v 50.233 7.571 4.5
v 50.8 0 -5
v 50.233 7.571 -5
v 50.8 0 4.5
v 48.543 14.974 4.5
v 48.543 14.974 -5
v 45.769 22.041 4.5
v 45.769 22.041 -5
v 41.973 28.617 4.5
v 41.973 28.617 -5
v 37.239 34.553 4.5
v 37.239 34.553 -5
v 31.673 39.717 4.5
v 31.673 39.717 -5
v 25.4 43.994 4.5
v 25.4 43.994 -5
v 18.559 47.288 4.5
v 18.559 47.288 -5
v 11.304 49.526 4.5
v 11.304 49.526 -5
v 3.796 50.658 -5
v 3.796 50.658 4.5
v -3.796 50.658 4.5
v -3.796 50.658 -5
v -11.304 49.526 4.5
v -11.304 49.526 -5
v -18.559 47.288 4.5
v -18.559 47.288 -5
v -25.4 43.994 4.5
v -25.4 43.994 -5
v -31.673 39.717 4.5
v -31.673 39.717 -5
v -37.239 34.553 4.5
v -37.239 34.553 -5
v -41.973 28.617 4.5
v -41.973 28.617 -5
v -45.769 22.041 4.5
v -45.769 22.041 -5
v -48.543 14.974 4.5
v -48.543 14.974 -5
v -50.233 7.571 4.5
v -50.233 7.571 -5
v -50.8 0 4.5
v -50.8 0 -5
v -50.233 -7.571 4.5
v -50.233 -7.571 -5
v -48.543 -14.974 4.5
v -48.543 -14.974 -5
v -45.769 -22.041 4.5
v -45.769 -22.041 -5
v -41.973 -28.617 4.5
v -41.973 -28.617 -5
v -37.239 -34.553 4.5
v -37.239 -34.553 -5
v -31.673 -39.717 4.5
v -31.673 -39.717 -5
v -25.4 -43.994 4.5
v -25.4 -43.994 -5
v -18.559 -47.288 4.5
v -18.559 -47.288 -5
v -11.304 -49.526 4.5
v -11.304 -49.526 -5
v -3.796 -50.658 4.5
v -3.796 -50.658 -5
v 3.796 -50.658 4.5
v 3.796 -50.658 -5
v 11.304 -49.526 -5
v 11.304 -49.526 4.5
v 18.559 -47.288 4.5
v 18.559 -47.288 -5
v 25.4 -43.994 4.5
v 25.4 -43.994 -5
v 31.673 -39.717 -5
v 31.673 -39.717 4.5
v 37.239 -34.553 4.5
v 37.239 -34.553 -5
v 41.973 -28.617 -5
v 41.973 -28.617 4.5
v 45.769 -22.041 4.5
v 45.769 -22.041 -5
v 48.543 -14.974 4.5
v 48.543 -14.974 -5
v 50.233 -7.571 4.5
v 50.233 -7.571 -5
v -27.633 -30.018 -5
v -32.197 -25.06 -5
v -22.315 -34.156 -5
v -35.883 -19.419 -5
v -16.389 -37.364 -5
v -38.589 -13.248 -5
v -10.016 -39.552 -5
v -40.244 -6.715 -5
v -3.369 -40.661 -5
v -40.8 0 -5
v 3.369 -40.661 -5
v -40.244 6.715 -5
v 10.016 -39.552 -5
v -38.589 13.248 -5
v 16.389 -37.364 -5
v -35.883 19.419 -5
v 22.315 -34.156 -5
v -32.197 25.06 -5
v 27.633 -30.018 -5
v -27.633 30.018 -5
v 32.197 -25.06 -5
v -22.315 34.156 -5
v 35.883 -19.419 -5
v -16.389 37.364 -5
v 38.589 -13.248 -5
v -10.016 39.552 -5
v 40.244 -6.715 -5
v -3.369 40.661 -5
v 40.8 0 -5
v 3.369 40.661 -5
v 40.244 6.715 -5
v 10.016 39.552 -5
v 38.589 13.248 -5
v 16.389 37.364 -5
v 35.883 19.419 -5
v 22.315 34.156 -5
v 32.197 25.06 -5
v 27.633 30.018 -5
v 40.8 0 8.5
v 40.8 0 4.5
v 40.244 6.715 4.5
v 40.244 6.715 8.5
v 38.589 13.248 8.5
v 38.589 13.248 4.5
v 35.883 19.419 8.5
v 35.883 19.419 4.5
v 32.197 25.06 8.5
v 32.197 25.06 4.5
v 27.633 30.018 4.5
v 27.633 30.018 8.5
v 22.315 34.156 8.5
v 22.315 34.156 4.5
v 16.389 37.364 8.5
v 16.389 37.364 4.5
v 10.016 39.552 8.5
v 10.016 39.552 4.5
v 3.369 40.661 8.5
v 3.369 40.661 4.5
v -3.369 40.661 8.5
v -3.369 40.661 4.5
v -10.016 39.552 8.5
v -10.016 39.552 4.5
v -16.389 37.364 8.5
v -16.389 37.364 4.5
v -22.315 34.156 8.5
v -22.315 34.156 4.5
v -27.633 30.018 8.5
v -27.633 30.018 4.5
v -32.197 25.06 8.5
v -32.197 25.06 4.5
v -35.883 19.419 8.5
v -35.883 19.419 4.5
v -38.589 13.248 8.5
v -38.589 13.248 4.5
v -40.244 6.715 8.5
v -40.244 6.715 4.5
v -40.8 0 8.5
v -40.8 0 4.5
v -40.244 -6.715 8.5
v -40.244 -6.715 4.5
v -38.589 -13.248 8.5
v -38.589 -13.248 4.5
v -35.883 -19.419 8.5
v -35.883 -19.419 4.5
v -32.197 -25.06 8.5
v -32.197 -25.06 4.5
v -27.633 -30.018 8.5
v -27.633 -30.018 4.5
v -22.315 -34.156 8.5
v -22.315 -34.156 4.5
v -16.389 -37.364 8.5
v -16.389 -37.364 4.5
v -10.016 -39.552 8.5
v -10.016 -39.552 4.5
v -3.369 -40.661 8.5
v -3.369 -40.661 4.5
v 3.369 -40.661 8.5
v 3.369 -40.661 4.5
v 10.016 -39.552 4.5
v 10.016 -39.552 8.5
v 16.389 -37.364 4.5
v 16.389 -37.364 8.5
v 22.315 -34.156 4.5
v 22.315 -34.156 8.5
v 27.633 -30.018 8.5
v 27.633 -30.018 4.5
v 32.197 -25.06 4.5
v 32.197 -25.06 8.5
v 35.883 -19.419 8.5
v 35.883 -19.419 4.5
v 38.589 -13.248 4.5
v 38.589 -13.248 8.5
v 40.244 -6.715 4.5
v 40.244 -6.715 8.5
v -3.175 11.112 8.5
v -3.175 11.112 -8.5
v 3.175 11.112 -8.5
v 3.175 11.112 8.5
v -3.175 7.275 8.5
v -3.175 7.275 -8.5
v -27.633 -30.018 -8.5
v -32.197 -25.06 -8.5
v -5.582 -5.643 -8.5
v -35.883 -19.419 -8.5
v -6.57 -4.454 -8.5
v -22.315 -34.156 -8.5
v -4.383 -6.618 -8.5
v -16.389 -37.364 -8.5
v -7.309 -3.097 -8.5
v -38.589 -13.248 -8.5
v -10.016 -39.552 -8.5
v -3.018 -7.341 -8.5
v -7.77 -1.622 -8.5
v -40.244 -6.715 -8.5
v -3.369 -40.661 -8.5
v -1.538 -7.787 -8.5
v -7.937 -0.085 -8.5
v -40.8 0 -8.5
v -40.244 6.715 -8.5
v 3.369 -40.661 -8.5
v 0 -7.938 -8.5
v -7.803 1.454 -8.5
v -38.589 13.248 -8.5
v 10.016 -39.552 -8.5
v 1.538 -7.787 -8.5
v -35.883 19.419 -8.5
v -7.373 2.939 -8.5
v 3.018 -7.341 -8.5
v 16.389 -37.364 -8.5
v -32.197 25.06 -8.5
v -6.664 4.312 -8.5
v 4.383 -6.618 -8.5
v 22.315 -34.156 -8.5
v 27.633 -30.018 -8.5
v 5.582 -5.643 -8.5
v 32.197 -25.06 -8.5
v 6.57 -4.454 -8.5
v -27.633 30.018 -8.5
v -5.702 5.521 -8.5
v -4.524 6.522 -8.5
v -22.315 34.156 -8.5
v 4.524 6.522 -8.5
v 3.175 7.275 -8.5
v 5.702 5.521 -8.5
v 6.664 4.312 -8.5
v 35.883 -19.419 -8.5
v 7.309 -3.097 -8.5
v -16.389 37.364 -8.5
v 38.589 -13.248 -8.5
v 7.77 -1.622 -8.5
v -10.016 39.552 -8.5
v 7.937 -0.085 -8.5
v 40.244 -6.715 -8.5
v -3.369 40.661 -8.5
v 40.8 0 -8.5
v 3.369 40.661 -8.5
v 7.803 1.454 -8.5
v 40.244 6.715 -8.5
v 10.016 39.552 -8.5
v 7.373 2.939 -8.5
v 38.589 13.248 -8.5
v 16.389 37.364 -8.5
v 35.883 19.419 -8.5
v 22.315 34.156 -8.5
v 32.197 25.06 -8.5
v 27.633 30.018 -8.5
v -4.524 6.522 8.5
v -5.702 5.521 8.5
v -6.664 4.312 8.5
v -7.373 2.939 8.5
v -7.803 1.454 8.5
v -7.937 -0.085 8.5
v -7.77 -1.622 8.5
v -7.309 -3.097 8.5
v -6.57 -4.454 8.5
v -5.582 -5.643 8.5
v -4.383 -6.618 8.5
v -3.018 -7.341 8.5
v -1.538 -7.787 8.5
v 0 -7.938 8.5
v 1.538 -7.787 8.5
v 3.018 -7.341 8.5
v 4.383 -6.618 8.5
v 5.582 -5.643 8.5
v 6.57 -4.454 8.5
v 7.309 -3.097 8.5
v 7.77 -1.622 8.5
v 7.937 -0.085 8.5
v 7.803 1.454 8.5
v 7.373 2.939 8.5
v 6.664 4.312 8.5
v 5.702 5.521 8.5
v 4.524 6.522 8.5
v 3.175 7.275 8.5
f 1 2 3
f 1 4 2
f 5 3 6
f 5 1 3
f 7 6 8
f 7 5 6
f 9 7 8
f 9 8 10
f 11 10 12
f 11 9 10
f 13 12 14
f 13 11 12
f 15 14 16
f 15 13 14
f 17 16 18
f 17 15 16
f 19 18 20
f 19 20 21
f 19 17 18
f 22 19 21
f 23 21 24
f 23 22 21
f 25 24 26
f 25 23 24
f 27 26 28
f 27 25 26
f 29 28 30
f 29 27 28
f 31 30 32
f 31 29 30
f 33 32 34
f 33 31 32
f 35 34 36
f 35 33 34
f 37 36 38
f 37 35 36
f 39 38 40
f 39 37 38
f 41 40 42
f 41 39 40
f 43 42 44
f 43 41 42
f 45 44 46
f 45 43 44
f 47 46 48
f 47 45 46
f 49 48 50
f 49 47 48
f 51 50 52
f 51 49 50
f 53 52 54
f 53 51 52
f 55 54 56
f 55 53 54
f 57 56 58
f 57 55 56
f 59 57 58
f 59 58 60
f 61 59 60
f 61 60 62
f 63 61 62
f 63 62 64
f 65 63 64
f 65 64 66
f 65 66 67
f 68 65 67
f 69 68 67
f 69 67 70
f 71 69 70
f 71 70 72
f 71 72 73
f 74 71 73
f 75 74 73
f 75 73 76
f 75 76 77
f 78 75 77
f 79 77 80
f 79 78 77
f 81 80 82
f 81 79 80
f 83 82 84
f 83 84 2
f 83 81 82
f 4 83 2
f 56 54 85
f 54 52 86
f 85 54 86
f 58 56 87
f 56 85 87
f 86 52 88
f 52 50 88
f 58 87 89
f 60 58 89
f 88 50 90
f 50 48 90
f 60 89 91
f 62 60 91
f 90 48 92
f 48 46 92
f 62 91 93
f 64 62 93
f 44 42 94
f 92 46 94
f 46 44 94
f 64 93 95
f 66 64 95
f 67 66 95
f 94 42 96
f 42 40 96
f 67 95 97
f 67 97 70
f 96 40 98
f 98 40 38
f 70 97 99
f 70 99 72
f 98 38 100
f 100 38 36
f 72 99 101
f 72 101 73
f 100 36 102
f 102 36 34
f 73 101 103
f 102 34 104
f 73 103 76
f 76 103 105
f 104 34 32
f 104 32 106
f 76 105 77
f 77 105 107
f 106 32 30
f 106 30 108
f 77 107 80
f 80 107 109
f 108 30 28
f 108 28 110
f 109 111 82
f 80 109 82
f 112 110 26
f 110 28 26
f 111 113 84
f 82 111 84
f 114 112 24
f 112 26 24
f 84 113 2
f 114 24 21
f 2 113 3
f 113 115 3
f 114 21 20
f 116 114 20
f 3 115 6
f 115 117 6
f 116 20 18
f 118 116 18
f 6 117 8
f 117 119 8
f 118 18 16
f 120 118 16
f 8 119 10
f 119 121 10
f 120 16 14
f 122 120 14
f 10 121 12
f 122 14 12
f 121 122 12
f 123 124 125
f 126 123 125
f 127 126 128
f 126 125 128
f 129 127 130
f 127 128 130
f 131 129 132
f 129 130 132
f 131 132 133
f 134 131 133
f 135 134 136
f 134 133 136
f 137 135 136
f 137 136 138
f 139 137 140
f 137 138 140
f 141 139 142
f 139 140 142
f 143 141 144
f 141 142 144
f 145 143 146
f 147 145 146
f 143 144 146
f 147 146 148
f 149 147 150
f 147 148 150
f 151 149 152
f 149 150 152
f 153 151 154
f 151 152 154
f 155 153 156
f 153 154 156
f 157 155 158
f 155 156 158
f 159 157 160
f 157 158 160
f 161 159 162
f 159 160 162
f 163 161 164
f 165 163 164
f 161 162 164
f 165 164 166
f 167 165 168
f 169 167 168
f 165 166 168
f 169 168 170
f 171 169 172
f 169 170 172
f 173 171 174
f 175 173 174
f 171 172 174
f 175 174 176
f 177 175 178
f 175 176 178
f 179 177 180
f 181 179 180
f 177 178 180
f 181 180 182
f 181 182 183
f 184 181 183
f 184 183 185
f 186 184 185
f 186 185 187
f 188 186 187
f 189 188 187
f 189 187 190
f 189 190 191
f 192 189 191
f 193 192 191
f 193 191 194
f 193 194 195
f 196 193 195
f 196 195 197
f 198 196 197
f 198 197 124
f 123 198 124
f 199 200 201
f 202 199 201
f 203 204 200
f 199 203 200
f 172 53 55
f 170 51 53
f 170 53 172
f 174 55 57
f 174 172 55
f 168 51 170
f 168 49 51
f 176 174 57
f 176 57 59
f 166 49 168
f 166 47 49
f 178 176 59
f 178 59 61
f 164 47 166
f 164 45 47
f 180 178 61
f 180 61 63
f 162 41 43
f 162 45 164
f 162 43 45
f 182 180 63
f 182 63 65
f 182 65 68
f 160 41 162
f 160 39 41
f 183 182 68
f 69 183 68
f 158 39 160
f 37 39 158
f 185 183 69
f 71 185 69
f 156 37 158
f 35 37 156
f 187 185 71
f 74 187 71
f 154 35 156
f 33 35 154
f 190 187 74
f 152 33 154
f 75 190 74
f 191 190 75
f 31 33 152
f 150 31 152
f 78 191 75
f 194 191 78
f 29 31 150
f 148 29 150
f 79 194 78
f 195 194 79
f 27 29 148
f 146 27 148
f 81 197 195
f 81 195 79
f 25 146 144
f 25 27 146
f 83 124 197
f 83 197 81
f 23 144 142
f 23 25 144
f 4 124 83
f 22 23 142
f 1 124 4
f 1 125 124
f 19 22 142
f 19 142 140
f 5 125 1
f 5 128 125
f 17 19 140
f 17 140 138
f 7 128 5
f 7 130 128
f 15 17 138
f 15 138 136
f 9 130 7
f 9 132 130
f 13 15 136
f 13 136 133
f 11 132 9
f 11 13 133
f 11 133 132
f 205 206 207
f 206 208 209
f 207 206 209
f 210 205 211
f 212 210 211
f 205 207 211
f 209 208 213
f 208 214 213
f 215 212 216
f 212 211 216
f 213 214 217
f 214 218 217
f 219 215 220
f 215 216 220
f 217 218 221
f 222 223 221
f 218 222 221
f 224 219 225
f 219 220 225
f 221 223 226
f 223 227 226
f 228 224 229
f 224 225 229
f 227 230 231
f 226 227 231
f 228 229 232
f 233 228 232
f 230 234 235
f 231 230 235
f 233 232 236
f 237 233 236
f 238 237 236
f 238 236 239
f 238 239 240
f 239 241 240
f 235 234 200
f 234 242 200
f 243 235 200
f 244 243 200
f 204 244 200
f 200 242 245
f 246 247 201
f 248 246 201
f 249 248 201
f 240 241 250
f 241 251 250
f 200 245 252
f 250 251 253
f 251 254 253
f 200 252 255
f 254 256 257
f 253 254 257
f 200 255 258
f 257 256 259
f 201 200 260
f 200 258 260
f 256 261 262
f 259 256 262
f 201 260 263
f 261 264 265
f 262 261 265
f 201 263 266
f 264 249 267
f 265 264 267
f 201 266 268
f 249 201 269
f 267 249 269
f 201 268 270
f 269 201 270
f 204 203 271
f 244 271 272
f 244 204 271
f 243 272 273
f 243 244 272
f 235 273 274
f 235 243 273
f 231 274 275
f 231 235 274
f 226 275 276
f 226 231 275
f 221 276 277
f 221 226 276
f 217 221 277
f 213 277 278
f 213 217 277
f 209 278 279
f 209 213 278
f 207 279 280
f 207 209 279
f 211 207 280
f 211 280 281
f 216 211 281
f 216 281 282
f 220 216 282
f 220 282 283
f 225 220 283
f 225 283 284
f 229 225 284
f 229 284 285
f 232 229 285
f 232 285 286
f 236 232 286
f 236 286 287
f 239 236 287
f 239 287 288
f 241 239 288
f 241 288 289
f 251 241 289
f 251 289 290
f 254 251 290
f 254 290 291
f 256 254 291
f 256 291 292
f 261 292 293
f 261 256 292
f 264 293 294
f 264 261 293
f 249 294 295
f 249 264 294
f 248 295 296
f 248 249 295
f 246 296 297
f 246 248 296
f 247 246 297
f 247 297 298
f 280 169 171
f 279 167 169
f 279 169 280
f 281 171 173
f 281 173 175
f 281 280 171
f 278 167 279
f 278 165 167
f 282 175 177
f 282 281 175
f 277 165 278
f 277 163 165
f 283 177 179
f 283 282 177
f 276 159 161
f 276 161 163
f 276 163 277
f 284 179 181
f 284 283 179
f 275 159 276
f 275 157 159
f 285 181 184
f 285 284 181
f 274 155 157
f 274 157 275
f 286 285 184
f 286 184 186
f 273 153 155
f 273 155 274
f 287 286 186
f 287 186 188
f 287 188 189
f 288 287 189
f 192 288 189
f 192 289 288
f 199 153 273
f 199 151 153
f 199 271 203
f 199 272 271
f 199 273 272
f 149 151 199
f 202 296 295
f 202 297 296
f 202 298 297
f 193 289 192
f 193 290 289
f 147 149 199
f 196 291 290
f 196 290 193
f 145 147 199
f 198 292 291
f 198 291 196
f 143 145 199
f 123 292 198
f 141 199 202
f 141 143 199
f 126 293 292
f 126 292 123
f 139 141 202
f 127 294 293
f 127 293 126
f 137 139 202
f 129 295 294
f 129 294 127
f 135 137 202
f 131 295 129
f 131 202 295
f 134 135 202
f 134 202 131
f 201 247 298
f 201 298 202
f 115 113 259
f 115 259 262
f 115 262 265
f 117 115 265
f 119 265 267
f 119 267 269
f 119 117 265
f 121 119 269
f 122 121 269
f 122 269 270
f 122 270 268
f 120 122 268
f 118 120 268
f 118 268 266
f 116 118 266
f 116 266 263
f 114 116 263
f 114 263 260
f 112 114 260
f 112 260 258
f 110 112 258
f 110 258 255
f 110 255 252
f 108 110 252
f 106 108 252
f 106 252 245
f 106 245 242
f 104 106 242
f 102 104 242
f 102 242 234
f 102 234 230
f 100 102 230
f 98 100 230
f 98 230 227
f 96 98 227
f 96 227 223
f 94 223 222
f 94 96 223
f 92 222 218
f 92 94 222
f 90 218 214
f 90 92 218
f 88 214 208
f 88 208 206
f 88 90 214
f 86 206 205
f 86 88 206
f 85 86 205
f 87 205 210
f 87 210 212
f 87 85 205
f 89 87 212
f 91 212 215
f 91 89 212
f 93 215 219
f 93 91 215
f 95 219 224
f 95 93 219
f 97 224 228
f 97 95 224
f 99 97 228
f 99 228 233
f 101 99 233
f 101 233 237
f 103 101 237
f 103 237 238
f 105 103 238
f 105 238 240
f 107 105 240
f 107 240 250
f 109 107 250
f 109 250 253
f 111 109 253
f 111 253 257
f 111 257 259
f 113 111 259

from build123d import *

# Parameters (mm, degrees)
F0_R          = 50.8
F0_R_2        = 7.9375
F1_DEPTH      = 4.5
F1_DEPTH_BACK = 5
F2_R          = 40.8
F2_R_2        = 7.9375
F3_DEPTH      = 4
F4_W          = 6.35
F4_H          = 6.35
F5_DEPTH      = 17.001


# Not quite as in the source:
# - a pattern or mirror of a feature is missing from the dataset's text; its kind, count and spacing are read off the source's solid


with BuildPart() as f1:
    # F0 (on Top) → F1 (new body, two sides)
    with BuildSketch(Plane.XY) as f1_sk:
        Circle(F0_R)
        Circle(F0_R_2, mode=Mode.SUBTRACT)
    extrude(amount=F1_DEPTH)
    extrude(f1_sk.sketch, amount=-F1_DEPTH_BACK)

    # F2 (on face) → F3 (join)
    with BuildSketch(Plane.XY.offset(4.5)):
        Circle(F2_R)
        Circle(F2_R_2, mode=Mode.SUBTRACT)
    f3 = extrude(amount=F3_DEPTH)

    # F3_copies: F3 across plane
    add(f3.mirror(Plane(origin=(0, 0, 0), x_dir=(-1, 0, 0), z_dir=(0, 0, -1))))

    # F4 (on face) → F5 (cut, through all)
    with BuildSketch(Plane.XY.offset(8.5)):
        with Locations((0, 7.9375)):
            Rectangle(F4_W, F4_H)
    extrude(amount=-F5_DEPTH, mode=Mode.SUBTRACT)


solid = f1.part
